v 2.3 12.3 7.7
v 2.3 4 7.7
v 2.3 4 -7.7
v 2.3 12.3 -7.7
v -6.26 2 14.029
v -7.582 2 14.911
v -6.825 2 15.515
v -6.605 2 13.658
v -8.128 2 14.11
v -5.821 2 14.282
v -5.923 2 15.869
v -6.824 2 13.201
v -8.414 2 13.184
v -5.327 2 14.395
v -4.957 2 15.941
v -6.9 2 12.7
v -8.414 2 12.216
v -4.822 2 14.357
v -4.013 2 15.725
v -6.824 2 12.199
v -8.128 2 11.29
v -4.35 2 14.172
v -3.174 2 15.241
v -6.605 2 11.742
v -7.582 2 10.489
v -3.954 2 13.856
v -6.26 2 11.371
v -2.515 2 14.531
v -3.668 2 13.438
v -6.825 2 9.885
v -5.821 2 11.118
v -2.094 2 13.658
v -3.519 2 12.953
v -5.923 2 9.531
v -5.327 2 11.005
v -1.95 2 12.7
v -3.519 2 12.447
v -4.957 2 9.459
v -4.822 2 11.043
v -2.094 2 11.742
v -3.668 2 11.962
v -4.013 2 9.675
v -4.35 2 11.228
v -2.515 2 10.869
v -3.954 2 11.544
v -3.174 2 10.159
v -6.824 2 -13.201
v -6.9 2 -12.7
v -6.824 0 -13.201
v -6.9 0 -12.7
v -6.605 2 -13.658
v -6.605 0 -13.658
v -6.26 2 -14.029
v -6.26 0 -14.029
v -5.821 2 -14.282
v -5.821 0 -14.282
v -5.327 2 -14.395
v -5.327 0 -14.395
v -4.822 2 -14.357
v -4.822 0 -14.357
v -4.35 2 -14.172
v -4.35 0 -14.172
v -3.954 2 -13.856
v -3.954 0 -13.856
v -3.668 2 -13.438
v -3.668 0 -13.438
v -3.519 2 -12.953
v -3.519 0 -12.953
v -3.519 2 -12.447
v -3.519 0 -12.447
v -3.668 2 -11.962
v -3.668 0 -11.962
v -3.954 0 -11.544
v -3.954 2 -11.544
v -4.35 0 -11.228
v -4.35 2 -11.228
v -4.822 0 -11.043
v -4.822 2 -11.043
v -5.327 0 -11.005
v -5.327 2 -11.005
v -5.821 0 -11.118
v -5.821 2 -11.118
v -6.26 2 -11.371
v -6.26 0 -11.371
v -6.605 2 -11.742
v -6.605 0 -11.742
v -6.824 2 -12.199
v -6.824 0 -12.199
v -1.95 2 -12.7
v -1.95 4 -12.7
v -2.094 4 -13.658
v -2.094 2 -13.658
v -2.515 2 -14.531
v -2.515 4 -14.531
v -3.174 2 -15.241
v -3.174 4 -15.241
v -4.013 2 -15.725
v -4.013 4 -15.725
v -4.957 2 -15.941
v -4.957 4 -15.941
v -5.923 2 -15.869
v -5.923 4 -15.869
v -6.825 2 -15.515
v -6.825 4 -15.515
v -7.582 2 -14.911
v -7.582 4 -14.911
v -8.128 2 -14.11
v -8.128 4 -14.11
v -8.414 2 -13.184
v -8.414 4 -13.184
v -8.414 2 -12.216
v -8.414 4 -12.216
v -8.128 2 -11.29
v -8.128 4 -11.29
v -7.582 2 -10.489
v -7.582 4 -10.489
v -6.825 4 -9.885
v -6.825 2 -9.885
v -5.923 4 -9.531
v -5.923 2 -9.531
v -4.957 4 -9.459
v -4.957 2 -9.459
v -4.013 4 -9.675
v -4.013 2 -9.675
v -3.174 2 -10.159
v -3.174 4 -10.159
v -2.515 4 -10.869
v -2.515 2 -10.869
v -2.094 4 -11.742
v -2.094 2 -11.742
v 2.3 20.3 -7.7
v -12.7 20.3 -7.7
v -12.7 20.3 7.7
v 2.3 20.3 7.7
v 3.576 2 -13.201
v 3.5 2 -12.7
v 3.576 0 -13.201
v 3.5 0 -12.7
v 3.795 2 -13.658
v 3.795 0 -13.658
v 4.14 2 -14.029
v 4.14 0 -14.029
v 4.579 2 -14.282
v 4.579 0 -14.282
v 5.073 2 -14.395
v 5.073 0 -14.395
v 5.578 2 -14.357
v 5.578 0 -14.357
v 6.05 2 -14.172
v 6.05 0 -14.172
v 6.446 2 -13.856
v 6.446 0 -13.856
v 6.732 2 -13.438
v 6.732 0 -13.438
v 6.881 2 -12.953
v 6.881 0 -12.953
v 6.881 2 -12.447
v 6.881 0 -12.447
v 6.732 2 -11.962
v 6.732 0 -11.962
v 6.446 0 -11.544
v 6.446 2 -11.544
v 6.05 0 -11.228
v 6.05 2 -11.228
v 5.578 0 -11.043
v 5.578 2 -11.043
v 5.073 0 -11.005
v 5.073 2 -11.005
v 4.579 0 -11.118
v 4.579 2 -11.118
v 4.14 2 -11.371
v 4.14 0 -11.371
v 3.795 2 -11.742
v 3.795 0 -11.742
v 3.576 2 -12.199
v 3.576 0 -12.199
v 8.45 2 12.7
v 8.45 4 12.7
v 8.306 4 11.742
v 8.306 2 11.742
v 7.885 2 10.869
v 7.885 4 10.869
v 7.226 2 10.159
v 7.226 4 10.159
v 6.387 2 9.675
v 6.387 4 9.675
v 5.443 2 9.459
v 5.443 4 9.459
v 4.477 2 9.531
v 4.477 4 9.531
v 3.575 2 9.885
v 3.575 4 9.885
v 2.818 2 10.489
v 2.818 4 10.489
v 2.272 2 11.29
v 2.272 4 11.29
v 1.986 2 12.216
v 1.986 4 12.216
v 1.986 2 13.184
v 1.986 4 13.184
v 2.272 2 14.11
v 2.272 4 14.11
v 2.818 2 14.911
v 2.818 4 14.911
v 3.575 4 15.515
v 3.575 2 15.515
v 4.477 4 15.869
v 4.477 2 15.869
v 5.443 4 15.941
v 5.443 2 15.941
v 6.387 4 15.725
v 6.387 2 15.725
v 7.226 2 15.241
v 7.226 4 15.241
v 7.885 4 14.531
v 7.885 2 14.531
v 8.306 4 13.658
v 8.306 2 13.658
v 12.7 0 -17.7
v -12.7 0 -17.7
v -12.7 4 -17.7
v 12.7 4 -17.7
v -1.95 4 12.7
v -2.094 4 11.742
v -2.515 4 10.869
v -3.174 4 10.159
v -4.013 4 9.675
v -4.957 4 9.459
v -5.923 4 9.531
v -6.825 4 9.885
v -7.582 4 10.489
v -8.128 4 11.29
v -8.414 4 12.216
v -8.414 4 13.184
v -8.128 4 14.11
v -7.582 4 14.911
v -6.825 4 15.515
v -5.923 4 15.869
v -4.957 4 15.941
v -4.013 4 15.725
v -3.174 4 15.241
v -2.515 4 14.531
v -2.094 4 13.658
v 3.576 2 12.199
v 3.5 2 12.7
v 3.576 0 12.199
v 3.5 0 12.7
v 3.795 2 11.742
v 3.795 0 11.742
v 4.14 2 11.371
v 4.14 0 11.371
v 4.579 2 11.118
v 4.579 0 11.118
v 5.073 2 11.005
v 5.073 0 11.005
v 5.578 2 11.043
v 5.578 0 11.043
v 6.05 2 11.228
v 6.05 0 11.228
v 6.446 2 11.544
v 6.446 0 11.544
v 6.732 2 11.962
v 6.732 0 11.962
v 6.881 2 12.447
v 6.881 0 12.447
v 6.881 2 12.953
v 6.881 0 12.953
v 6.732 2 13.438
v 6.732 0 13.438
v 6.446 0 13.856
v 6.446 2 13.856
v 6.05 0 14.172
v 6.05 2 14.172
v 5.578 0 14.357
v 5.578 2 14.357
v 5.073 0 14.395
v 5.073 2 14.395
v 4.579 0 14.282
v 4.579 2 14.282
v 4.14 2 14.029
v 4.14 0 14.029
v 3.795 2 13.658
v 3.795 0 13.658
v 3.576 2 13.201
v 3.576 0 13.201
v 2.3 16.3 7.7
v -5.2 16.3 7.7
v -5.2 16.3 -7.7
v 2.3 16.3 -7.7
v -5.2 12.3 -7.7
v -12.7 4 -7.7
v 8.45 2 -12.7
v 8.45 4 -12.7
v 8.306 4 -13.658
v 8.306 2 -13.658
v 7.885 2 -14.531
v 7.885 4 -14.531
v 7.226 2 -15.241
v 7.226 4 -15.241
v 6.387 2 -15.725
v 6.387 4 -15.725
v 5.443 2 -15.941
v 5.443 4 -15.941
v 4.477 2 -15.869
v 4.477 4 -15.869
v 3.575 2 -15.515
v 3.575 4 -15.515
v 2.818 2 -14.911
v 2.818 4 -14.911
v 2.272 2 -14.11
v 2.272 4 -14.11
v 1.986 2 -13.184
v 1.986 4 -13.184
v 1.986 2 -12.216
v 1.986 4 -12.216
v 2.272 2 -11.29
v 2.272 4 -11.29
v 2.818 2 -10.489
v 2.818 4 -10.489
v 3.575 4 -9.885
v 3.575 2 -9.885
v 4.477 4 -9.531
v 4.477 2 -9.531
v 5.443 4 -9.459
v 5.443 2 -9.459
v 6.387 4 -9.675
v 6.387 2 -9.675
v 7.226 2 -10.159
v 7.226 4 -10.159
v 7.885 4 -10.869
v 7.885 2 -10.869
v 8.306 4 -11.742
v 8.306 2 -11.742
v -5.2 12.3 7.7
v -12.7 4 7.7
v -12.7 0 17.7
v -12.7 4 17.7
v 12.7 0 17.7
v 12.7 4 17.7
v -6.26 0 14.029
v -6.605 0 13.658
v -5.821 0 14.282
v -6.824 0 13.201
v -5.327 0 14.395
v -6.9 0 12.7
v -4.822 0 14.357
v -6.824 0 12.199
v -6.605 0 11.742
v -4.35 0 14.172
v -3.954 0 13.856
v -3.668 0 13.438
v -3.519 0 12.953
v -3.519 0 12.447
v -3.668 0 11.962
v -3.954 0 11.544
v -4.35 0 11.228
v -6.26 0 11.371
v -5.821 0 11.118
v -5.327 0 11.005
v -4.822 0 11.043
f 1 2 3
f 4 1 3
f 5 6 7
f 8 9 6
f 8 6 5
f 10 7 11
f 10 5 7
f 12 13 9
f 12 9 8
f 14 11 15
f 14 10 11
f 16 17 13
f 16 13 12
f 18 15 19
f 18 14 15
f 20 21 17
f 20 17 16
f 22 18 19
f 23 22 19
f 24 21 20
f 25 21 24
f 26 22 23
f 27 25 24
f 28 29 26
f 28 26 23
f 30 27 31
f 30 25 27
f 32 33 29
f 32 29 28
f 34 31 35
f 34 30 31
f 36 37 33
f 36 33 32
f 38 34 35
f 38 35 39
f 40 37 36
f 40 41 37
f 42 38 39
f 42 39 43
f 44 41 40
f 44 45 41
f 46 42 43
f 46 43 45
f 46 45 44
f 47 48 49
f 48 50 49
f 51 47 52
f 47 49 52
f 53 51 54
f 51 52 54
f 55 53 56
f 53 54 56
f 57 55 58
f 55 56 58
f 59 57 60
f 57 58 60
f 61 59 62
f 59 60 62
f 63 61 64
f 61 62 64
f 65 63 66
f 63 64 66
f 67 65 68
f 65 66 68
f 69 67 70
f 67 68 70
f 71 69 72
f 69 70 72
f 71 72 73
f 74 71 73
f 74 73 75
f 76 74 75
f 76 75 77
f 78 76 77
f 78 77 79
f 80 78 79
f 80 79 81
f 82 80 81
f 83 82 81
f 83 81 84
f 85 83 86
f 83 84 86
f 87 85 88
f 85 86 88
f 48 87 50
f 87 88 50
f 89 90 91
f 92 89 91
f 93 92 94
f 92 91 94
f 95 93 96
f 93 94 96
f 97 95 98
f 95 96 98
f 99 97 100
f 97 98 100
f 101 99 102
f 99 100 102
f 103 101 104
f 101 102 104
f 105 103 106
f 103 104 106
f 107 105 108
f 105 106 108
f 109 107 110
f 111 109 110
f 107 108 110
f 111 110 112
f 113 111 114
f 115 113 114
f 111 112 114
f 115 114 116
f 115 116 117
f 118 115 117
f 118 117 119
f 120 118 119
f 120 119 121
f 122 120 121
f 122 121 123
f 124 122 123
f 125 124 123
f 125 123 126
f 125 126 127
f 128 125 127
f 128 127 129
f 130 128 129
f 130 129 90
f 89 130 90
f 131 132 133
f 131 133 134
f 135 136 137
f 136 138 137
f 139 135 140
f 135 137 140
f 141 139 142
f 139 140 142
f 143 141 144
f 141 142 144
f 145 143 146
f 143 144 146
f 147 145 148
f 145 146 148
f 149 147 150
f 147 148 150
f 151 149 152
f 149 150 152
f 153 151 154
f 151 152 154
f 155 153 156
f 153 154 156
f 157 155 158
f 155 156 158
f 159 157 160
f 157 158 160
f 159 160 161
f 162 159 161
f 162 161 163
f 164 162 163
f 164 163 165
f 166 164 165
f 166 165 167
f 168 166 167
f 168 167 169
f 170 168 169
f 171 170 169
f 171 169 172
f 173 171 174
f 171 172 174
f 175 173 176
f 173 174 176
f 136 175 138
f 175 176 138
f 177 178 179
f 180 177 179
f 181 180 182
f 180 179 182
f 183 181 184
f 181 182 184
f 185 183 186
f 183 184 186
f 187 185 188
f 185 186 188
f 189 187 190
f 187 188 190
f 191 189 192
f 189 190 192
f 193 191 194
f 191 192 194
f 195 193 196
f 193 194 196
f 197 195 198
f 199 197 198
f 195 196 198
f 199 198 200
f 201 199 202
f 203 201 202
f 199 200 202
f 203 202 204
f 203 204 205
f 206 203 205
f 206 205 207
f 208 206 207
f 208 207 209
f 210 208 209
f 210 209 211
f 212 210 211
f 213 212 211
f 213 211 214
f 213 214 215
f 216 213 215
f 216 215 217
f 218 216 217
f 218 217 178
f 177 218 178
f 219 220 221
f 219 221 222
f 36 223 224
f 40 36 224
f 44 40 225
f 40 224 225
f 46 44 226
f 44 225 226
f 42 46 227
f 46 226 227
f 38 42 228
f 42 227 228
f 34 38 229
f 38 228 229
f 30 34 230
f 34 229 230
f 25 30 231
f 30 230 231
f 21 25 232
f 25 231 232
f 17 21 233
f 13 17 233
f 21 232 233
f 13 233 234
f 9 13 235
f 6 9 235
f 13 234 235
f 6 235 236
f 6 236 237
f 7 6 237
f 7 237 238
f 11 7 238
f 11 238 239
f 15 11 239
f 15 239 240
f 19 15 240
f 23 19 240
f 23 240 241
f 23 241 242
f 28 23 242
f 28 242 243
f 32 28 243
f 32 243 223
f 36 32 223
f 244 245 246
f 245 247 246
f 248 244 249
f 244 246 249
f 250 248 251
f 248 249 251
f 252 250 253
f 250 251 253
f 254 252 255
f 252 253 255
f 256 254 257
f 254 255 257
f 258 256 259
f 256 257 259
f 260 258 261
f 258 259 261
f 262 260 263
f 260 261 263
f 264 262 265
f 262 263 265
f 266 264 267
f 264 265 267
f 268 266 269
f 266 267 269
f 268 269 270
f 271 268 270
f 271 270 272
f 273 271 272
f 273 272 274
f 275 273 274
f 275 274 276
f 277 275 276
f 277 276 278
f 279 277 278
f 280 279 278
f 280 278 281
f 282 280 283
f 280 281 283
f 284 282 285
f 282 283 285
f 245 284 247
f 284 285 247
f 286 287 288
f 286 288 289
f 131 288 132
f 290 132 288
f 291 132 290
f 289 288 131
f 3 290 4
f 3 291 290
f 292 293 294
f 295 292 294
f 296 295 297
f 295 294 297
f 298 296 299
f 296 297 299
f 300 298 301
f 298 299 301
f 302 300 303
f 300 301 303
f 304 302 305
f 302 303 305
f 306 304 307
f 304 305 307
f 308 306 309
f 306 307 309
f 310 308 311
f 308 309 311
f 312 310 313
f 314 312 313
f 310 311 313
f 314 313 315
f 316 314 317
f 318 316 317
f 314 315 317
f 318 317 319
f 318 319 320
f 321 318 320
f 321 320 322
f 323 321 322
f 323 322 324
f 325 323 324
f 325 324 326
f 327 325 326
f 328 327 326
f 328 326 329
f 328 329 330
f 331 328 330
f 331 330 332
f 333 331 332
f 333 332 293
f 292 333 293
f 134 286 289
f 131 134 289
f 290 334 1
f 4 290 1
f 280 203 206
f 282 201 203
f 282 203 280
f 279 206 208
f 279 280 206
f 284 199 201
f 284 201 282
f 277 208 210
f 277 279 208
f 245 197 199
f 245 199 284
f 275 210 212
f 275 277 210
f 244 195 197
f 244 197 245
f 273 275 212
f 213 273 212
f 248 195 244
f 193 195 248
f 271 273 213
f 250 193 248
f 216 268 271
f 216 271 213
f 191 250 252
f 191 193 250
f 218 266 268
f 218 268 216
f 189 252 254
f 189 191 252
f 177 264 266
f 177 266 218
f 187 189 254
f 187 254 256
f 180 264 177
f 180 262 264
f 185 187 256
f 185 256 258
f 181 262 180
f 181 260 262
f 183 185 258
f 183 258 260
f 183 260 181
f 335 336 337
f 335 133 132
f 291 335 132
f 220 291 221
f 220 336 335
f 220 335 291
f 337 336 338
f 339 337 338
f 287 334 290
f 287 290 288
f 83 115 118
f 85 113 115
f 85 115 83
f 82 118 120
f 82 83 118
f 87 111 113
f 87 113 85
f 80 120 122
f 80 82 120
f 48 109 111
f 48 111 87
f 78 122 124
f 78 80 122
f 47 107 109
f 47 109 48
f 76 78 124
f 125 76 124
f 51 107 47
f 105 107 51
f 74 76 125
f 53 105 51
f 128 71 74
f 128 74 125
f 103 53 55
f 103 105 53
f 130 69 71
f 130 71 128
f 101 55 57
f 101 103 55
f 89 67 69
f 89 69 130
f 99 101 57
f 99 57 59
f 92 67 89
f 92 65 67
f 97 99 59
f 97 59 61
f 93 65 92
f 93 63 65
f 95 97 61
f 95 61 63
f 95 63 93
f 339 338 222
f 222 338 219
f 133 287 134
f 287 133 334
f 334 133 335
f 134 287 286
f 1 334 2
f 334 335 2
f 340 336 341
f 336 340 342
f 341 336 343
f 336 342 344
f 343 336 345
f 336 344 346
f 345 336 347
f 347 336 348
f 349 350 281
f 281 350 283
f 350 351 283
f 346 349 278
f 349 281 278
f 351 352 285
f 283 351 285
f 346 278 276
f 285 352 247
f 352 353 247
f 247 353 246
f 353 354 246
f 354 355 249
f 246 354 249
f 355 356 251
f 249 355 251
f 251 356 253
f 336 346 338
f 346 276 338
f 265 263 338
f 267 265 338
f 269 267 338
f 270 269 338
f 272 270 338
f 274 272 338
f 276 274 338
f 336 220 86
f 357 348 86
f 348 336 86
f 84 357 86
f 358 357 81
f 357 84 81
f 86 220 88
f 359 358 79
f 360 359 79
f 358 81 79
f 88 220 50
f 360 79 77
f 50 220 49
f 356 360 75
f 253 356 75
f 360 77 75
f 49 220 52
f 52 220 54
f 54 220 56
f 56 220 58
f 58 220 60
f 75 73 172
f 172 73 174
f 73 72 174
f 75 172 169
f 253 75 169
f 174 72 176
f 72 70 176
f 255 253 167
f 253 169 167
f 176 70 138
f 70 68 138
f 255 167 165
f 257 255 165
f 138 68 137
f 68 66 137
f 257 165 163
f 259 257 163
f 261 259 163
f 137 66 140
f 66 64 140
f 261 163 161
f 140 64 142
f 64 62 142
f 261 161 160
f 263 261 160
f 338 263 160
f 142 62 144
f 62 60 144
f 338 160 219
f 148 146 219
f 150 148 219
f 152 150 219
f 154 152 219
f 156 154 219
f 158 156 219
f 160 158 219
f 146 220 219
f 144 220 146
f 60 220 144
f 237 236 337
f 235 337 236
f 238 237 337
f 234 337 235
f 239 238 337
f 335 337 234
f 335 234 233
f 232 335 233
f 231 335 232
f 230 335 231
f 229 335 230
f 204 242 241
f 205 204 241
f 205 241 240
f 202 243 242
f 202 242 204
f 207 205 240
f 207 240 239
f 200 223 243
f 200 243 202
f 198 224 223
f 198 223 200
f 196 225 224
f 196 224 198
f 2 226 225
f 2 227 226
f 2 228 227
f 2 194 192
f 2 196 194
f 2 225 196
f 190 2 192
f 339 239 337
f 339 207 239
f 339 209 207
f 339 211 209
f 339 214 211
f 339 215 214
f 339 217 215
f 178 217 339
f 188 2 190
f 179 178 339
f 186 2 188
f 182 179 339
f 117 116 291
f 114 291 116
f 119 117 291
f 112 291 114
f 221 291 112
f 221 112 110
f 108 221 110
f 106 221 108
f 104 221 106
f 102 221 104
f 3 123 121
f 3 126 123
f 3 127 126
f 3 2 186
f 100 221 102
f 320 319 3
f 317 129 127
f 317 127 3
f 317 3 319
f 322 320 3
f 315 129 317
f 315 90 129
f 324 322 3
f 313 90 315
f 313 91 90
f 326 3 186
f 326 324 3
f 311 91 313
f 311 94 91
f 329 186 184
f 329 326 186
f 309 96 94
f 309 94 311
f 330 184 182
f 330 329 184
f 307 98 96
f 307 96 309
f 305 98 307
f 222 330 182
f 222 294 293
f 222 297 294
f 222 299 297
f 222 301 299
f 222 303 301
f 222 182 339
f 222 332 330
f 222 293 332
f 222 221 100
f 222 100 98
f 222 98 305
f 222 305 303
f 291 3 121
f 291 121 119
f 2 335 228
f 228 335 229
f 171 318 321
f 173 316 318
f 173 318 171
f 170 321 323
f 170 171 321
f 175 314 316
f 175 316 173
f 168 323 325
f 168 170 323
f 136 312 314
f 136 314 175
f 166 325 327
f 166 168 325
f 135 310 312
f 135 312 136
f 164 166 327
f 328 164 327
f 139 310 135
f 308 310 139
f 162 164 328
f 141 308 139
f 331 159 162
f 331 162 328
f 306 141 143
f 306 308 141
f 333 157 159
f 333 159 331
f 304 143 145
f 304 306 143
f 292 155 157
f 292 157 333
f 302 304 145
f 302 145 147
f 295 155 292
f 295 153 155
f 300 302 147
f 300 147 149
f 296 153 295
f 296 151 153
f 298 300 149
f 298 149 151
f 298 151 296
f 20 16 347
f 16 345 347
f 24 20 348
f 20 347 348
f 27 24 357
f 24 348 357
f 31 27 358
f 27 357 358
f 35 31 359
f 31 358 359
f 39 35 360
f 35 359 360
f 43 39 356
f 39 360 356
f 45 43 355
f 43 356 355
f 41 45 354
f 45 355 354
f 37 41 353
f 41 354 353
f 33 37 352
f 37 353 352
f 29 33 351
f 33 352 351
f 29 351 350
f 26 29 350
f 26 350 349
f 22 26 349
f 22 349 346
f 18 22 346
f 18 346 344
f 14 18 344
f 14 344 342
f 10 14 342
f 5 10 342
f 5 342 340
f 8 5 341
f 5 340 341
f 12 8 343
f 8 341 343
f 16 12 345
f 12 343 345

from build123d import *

# Parameters (mm, degrees)
CROQUIS1_W                                           = 10.4
CROQUIS1_H                                           = 20.4
SALIENTE_EXTRUIR1_DEPTH                              = 4
CROQUIS2_W                                           = 25.4
CROQUIS2_H                                           = 35.4
SALIENTE_EXTRUIR2_DEPTH                              = 4
CROQUIS3_W                                           = 15
CROQUIS3_H                                           = 15.4
SALIENTE_EXTRUIR3_DEPTH                              = 16.3
CROQUIS4_W                                           = 7.5
CROQUIS4_H                                           = 4
CORTAR_EXTRUIR1_DEPTH                                = 35.907592297
REFRENTADO_PARA_TORNILLO_CON_CABEZA_PLAN_D           = 3.4
REFRENTADO_PARA_TORNILLO_CON_CABEZA_PLAN_CBORE_D     = 6.5
REFRENTADO_PARA_TORNILLO_CON_CABEZA_PLAN_CBORE_DEPTH = 2


with BuildPart() as part:
    # Croquis1 → Saliente-Extruir1 (new body)
    with BuildSketch(Plane(origin=(0, 0, 0), x_dir=(1, 0, 0), z_dir=(0, 1, 0))):
        Rectangle(CROQUIS1_W, CROQUIS1_H)
    extrude(amount=SALIENTE_EXTRUIR1_DEPTH)

    # Croquis2 → Saliente-Extruir2 (add)
    with BuildSketch(Plane(origin=(0, 0, 0), x_dir=(1, 0, 0), z_dir=(0, 1, 0))):
        Rectangle(CROQUIS2_W, CROQUIS2_H)
    extrude(amount=SALIENTE_EXTRUIR2_DEPTH)

    # Croquis3 → Saliente-Extruir3 (add)
    with BuildSketch(Plane(origin=(0, 4, 0), x_dir=(1, 0, 0), z_dir=(0, 1, 0))):
        with Locations((-5.2, 0)):
            Rectangle(CROQUIS3_W, CROQUIS3_H)
    extrude(amount=SALIENTE_EXTRUIR3_DEPTH)

    # Croquis4 → Cortar-Extruir1 (cut, through all)
    with BuildSketch(Plane.XY.offset(7.7)):
        with Locations((-1.45, 14.3)):
            Rectangle(CROQUIS4_W, CROQUIS4_H)
    extrude(amount=-CORTAR_EXTRUIR1_DEPTH, mode=Mode.SUBTRACT)

    # Refrentado para tornillo con cabeza plana de M32 (through all)
    with Locations(Plane(origin=(0, 4, 0), x_dir=(1, 0, 0), z_dir=(0, 1, 0))):
        with Locations((-5.2, 12.7), (-5.2, -12.7), (5.2, -12.7), (5.2, 12.7)):
            CounterBoreHole(REFRENTADO_PARA_TORNILLO_CON_CABEZA_PLAN_D / 2, REFRENTADO_PARA_TORNILLO_CON_CABEZA_PLAN_CBORE_D / 2, REFRENTADO_PARA_TORNILLO_CON_CABEZA_PLAN_CBORE_DEPTH)


solid = part.part
